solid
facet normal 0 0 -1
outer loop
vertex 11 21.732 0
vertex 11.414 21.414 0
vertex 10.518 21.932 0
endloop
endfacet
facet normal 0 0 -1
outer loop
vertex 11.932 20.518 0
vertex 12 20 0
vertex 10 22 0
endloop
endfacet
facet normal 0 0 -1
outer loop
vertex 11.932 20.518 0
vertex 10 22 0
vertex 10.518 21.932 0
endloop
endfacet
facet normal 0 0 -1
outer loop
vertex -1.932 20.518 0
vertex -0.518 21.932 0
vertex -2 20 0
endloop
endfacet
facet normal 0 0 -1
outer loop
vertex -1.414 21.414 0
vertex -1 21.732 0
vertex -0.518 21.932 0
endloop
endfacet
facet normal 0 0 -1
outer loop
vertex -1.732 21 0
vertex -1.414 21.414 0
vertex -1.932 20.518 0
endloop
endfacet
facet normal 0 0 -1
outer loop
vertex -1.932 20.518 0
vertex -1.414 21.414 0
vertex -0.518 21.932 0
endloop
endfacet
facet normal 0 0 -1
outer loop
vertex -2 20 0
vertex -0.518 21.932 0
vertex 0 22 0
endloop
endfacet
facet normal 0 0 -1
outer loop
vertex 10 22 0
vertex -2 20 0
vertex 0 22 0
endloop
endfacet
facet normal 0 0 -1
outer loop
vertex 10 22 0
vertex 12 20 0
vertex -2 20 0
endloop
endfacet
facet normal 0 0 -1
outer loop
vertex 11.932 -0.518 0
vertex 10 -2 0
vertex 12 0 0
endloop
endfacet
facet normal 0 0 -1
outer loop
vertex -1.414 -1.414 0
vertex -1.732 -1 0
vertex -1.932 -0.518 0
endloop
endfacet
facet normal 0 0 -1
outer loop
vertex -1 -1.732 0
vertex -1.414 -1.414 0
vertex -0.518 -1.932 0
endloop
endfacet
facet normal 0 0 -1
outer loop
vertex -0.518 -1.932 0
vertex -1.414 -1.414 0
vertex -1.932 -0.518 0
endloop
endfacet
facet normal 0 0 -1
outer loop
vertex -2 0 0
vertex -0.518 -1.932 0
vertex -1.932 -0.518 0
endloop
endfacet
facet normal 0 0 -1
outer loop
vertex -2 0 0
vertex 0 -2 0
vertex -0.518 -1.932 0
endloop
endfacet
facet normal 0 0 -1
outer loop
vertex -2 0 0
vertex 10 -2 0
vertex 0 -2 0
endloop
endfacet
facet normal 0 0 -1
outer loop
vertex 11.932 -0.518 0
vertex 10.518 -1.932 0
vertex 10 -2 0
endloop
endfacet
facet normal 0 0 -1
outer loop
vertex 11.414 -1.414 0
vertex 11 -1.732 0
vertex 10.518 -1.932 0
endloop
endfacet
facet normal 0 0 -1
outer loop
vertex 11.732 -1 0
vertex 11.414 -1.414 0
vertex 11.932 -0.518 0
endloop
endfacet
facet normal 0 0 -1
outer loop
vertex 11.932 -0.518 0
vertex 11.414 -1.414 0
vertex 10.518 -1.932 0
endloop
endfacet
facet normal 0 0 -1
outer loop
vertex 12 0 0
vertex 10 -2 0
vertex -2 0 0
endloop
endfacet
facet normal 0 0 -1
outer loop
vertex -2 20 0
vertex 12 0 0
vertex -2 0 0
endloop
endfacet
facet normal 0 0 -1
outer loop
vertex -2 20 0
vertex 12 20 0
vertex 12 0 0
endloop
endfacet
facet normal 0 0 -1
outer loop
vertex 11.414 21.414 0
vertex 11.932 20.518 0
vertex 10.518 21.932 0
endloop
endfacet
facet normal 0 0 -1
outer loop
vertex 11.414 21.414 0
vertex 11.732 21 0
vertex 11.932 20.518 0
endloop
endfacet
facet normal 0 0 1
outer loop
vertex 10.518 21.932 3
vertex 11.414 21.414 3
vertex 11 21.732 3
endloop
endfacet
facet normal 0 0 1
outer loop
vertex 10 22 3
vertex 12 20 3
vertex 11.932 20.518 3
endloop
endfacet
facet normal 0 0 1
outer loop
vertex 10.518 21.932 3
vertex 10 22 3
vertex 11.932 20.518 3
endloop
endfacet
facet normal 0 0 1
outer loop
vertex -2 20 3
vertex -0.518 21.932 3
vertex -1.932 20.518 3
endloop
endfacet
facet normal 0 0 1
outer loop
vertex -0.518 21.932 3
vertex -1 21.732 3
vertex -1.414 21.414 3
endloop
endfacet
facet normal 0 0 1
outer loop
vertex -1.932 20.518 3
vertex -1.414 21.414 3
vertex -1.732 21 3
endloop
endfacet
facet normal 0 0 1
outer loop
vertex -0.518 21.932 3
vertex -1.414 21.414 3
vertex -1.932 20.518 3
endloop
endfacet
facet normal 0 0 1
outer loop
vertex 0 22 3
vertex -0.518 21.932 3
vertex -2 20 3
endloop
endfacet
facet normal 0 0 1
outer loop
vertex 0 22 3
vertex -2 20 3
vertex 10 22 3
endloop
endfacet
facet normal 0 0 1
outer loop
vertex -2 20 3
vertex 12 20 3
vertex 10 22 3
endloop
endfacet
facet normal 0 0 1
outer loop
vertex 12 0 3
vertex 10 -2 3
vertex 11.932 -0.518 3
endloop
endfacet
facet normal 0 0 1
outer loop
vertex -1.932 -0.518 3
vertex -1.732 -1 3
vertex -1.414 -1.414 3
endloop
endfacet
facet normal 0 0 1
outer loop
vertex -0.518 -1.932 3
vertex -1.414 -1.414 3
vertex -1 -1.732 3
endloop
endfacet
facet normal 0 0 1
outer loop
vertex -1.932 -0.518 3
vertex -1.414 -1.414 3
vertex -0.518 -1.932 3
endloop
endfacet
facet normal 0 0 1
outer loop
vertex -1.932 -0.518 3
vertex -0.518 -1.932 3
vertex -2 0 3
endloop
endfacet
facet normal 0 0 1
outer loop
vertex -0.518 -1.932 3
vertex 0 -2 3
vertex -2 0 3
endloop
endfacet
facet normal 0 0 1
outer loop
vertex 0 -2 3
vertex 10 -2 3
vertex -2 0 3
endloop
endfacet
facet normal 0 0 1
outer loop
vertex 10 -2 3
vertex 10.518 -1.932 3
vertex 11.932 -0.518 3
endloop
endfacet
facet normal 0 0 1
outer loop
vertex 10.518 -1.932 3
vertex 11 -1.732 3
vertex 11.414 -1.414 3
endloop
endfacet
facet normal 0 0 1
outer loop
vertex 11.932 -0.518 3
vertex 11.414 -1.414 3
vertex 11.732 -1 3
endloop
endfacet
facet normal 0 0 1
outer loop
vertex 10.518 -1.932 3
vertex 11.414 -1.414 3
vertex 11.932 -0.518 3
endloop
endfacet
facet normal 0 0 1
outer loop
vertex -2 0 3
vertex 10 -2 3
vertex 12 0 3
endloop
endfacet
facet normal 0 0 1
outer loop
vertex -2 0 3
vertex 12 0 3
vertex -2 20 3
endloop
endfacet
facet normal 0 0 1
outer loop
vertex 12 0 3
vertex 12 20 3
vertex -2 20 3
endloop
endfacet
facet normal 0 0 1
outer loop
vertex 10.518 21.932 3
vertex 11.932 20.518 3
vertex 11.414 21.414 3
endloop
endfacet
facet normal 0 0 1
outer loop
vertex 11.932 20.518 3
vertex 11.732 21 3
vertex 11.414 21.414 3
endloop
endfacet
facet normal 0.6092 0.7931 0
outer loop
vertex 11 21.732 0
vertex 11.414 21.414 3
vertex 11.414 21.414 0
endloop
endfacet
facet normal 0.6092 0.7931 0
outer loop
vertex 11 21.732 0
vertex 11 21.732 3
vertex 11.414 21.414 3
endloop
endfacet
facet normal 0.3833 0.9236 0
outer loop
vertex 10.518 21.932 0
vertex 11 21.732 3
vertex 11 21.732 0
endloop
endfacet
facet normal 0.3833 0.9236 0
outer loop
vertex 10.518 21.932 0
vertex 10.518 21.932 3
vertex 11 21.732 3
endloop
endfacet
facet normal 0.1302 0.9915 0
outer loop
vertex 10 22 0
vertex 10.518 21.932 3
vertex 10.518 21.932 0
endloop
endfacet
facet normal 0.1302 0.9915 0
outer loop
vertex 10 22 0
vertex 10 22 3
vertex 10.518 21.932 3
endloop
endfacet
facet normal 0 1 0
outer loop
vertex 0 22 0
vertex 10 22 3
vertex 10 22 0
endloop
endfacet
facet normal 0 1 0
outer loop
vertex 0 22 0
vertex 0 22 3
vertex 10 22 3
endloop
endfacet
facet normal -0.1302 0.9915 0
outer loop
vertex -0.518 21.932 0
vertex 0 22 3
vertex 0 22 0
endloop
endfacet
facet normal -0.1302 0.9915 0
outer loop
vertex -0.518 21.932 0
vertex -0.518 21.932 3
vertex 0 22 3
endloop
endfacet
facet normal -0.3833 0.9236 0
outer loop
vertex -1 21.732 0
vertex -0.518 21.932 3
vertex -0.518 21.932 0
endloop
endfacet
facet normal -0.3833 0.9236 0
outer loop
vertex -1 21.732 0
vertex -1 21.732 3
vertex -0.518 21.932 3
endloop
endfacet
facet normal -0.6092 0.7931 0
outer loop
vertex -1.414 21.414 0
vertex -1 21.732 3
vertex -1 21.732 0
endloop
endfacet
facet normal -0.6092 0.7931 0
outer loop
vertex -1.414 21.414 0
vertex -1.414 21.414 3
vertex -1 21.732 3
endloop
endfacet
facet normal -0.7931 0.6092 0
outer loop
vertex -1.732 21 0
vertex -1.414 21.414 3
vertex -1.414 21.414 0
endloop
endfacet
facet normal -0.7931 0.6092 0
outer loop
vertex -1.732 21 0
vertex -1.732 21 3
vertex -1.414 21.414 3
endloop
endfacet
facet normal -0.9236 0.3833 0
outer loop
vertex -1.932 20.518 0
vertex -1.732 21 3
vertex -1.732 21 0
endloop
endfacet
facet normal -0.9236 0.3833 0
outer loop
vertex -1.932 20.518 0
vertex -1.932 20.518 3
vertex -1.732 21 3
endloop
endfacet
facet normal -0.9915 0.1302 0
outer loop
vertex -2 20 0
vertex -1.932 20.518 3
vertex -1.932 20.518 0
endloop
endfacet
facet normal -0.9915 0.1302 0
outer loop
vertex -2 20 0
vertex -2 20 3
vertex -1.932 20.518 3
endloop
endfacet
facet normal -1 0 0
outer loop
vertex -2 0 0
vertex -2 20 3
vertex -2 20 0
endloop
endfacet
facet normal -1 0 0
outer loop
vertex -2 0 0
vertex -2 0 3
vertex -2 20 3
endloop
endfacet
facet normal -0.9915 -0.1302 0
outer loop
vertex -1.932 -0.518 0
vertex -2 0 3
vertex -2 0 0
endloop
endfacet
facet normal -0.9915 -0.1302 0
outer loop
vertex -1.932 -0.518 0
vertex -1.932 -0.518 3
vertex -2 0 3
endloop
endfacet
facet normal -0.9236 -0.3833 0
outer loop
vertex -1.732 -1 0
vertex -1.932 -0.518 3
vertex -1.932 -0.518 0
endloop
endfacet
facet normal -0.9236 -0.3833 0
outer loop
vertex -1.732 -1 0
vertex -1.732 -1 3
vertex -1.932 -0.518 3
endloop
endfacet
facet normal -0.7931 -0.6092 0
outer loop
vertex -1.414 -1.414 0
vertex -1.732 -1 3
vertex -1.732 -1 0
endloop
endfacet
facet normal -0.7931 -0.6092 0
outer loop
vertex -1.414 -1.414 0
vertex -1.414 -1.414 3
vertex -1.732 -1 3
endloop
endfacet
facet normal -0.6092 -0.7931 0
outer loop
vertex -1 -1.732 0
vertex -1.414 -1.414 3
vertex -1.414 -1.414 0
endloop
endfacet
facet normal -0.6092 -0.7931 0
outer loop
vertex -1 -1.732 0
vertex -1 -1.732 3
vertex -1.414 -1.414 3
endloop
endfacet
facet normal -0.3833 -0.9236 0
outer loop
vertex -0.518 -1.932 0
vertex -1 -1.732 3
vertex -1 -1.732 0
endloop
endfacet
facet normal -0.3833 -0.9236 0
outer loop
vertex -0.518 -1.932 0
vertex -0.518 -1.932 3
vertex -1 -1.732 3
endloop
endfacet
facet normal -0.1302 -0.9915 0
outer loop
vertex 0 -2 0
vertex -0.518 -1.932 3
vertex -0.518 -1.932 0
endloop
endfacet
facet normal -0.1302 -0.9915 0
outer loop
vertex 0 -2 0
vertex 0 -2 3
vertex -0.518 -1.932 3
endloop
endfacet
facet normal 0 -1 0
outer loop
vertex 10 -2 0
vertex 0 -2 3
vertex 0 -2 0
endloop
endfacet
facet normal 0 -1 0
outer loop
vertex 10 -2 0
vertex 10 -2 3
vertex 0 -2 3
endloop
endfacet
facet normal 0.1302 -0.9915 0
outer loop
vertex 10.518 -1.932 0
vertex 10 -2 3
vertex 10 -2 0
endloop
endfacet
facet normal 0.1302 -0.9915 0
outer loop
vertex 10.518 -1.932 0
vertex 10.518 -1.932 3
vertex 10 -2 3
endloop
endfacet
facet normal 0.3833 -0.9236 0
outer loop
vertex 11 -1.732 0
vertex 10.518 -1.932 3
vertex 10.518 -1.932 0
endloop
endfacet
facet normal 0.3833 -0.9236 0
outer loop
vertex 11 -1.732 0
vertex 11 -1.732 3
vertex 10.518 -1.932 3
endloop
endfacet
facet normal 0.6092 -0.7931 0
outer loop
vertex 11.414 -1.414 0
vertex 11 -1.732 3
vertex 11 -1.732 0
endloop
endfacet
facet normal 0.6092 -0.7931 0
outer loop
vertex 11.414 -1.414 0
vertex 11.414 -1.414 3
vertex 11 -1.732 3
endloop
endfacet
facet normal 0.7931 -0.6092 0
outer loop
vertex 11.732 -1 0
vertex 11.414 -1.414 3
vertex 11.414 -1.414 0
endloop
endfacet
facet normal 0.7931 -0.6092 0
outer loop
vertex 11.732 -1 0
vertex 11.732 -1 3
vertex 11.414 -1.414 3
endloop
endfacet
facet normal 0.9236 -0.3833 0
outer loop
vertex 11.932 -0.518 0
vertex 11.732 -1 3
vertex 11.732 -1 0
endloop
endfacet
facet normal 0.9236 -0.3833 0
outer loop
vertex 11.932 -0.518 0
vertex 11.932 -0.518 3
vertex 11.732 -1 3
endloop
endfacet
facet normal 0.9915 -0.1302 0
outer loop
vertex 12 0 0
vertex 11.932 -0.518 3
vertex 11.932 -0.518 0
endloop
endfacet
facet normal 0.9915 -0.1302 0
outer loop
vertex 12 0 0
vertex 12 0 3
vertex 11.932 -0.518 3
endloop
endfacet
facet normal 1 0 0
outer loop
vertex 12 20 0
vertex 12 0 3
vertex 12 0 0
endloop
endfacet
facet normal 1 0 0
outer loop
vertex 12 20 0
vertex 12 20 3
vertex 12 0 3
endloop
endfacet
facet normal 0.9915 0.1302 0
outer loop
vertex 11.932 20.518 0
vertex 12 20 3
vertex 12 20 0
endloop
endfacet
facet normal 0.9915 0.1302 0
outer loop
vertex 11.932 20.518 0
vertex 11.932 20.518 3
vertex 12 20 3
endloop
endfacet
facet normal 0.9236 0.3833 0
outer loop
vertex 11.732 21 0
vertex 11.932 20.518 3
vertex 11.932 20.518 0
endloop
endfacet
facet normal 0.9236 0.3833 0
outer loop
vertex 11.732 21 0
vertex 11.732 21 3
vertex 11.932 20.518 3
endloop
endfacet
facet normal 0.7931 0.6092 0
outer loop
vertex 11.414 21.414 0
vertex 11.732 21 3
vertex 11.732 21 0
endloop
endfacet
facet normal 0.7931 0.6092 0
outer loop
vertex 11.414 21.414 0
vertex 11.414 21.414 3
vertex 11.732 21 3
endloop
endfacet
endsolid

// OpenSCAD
linear_extrude(3) minkowski(){ square([10,20]); circle(2, $fn=24); }
